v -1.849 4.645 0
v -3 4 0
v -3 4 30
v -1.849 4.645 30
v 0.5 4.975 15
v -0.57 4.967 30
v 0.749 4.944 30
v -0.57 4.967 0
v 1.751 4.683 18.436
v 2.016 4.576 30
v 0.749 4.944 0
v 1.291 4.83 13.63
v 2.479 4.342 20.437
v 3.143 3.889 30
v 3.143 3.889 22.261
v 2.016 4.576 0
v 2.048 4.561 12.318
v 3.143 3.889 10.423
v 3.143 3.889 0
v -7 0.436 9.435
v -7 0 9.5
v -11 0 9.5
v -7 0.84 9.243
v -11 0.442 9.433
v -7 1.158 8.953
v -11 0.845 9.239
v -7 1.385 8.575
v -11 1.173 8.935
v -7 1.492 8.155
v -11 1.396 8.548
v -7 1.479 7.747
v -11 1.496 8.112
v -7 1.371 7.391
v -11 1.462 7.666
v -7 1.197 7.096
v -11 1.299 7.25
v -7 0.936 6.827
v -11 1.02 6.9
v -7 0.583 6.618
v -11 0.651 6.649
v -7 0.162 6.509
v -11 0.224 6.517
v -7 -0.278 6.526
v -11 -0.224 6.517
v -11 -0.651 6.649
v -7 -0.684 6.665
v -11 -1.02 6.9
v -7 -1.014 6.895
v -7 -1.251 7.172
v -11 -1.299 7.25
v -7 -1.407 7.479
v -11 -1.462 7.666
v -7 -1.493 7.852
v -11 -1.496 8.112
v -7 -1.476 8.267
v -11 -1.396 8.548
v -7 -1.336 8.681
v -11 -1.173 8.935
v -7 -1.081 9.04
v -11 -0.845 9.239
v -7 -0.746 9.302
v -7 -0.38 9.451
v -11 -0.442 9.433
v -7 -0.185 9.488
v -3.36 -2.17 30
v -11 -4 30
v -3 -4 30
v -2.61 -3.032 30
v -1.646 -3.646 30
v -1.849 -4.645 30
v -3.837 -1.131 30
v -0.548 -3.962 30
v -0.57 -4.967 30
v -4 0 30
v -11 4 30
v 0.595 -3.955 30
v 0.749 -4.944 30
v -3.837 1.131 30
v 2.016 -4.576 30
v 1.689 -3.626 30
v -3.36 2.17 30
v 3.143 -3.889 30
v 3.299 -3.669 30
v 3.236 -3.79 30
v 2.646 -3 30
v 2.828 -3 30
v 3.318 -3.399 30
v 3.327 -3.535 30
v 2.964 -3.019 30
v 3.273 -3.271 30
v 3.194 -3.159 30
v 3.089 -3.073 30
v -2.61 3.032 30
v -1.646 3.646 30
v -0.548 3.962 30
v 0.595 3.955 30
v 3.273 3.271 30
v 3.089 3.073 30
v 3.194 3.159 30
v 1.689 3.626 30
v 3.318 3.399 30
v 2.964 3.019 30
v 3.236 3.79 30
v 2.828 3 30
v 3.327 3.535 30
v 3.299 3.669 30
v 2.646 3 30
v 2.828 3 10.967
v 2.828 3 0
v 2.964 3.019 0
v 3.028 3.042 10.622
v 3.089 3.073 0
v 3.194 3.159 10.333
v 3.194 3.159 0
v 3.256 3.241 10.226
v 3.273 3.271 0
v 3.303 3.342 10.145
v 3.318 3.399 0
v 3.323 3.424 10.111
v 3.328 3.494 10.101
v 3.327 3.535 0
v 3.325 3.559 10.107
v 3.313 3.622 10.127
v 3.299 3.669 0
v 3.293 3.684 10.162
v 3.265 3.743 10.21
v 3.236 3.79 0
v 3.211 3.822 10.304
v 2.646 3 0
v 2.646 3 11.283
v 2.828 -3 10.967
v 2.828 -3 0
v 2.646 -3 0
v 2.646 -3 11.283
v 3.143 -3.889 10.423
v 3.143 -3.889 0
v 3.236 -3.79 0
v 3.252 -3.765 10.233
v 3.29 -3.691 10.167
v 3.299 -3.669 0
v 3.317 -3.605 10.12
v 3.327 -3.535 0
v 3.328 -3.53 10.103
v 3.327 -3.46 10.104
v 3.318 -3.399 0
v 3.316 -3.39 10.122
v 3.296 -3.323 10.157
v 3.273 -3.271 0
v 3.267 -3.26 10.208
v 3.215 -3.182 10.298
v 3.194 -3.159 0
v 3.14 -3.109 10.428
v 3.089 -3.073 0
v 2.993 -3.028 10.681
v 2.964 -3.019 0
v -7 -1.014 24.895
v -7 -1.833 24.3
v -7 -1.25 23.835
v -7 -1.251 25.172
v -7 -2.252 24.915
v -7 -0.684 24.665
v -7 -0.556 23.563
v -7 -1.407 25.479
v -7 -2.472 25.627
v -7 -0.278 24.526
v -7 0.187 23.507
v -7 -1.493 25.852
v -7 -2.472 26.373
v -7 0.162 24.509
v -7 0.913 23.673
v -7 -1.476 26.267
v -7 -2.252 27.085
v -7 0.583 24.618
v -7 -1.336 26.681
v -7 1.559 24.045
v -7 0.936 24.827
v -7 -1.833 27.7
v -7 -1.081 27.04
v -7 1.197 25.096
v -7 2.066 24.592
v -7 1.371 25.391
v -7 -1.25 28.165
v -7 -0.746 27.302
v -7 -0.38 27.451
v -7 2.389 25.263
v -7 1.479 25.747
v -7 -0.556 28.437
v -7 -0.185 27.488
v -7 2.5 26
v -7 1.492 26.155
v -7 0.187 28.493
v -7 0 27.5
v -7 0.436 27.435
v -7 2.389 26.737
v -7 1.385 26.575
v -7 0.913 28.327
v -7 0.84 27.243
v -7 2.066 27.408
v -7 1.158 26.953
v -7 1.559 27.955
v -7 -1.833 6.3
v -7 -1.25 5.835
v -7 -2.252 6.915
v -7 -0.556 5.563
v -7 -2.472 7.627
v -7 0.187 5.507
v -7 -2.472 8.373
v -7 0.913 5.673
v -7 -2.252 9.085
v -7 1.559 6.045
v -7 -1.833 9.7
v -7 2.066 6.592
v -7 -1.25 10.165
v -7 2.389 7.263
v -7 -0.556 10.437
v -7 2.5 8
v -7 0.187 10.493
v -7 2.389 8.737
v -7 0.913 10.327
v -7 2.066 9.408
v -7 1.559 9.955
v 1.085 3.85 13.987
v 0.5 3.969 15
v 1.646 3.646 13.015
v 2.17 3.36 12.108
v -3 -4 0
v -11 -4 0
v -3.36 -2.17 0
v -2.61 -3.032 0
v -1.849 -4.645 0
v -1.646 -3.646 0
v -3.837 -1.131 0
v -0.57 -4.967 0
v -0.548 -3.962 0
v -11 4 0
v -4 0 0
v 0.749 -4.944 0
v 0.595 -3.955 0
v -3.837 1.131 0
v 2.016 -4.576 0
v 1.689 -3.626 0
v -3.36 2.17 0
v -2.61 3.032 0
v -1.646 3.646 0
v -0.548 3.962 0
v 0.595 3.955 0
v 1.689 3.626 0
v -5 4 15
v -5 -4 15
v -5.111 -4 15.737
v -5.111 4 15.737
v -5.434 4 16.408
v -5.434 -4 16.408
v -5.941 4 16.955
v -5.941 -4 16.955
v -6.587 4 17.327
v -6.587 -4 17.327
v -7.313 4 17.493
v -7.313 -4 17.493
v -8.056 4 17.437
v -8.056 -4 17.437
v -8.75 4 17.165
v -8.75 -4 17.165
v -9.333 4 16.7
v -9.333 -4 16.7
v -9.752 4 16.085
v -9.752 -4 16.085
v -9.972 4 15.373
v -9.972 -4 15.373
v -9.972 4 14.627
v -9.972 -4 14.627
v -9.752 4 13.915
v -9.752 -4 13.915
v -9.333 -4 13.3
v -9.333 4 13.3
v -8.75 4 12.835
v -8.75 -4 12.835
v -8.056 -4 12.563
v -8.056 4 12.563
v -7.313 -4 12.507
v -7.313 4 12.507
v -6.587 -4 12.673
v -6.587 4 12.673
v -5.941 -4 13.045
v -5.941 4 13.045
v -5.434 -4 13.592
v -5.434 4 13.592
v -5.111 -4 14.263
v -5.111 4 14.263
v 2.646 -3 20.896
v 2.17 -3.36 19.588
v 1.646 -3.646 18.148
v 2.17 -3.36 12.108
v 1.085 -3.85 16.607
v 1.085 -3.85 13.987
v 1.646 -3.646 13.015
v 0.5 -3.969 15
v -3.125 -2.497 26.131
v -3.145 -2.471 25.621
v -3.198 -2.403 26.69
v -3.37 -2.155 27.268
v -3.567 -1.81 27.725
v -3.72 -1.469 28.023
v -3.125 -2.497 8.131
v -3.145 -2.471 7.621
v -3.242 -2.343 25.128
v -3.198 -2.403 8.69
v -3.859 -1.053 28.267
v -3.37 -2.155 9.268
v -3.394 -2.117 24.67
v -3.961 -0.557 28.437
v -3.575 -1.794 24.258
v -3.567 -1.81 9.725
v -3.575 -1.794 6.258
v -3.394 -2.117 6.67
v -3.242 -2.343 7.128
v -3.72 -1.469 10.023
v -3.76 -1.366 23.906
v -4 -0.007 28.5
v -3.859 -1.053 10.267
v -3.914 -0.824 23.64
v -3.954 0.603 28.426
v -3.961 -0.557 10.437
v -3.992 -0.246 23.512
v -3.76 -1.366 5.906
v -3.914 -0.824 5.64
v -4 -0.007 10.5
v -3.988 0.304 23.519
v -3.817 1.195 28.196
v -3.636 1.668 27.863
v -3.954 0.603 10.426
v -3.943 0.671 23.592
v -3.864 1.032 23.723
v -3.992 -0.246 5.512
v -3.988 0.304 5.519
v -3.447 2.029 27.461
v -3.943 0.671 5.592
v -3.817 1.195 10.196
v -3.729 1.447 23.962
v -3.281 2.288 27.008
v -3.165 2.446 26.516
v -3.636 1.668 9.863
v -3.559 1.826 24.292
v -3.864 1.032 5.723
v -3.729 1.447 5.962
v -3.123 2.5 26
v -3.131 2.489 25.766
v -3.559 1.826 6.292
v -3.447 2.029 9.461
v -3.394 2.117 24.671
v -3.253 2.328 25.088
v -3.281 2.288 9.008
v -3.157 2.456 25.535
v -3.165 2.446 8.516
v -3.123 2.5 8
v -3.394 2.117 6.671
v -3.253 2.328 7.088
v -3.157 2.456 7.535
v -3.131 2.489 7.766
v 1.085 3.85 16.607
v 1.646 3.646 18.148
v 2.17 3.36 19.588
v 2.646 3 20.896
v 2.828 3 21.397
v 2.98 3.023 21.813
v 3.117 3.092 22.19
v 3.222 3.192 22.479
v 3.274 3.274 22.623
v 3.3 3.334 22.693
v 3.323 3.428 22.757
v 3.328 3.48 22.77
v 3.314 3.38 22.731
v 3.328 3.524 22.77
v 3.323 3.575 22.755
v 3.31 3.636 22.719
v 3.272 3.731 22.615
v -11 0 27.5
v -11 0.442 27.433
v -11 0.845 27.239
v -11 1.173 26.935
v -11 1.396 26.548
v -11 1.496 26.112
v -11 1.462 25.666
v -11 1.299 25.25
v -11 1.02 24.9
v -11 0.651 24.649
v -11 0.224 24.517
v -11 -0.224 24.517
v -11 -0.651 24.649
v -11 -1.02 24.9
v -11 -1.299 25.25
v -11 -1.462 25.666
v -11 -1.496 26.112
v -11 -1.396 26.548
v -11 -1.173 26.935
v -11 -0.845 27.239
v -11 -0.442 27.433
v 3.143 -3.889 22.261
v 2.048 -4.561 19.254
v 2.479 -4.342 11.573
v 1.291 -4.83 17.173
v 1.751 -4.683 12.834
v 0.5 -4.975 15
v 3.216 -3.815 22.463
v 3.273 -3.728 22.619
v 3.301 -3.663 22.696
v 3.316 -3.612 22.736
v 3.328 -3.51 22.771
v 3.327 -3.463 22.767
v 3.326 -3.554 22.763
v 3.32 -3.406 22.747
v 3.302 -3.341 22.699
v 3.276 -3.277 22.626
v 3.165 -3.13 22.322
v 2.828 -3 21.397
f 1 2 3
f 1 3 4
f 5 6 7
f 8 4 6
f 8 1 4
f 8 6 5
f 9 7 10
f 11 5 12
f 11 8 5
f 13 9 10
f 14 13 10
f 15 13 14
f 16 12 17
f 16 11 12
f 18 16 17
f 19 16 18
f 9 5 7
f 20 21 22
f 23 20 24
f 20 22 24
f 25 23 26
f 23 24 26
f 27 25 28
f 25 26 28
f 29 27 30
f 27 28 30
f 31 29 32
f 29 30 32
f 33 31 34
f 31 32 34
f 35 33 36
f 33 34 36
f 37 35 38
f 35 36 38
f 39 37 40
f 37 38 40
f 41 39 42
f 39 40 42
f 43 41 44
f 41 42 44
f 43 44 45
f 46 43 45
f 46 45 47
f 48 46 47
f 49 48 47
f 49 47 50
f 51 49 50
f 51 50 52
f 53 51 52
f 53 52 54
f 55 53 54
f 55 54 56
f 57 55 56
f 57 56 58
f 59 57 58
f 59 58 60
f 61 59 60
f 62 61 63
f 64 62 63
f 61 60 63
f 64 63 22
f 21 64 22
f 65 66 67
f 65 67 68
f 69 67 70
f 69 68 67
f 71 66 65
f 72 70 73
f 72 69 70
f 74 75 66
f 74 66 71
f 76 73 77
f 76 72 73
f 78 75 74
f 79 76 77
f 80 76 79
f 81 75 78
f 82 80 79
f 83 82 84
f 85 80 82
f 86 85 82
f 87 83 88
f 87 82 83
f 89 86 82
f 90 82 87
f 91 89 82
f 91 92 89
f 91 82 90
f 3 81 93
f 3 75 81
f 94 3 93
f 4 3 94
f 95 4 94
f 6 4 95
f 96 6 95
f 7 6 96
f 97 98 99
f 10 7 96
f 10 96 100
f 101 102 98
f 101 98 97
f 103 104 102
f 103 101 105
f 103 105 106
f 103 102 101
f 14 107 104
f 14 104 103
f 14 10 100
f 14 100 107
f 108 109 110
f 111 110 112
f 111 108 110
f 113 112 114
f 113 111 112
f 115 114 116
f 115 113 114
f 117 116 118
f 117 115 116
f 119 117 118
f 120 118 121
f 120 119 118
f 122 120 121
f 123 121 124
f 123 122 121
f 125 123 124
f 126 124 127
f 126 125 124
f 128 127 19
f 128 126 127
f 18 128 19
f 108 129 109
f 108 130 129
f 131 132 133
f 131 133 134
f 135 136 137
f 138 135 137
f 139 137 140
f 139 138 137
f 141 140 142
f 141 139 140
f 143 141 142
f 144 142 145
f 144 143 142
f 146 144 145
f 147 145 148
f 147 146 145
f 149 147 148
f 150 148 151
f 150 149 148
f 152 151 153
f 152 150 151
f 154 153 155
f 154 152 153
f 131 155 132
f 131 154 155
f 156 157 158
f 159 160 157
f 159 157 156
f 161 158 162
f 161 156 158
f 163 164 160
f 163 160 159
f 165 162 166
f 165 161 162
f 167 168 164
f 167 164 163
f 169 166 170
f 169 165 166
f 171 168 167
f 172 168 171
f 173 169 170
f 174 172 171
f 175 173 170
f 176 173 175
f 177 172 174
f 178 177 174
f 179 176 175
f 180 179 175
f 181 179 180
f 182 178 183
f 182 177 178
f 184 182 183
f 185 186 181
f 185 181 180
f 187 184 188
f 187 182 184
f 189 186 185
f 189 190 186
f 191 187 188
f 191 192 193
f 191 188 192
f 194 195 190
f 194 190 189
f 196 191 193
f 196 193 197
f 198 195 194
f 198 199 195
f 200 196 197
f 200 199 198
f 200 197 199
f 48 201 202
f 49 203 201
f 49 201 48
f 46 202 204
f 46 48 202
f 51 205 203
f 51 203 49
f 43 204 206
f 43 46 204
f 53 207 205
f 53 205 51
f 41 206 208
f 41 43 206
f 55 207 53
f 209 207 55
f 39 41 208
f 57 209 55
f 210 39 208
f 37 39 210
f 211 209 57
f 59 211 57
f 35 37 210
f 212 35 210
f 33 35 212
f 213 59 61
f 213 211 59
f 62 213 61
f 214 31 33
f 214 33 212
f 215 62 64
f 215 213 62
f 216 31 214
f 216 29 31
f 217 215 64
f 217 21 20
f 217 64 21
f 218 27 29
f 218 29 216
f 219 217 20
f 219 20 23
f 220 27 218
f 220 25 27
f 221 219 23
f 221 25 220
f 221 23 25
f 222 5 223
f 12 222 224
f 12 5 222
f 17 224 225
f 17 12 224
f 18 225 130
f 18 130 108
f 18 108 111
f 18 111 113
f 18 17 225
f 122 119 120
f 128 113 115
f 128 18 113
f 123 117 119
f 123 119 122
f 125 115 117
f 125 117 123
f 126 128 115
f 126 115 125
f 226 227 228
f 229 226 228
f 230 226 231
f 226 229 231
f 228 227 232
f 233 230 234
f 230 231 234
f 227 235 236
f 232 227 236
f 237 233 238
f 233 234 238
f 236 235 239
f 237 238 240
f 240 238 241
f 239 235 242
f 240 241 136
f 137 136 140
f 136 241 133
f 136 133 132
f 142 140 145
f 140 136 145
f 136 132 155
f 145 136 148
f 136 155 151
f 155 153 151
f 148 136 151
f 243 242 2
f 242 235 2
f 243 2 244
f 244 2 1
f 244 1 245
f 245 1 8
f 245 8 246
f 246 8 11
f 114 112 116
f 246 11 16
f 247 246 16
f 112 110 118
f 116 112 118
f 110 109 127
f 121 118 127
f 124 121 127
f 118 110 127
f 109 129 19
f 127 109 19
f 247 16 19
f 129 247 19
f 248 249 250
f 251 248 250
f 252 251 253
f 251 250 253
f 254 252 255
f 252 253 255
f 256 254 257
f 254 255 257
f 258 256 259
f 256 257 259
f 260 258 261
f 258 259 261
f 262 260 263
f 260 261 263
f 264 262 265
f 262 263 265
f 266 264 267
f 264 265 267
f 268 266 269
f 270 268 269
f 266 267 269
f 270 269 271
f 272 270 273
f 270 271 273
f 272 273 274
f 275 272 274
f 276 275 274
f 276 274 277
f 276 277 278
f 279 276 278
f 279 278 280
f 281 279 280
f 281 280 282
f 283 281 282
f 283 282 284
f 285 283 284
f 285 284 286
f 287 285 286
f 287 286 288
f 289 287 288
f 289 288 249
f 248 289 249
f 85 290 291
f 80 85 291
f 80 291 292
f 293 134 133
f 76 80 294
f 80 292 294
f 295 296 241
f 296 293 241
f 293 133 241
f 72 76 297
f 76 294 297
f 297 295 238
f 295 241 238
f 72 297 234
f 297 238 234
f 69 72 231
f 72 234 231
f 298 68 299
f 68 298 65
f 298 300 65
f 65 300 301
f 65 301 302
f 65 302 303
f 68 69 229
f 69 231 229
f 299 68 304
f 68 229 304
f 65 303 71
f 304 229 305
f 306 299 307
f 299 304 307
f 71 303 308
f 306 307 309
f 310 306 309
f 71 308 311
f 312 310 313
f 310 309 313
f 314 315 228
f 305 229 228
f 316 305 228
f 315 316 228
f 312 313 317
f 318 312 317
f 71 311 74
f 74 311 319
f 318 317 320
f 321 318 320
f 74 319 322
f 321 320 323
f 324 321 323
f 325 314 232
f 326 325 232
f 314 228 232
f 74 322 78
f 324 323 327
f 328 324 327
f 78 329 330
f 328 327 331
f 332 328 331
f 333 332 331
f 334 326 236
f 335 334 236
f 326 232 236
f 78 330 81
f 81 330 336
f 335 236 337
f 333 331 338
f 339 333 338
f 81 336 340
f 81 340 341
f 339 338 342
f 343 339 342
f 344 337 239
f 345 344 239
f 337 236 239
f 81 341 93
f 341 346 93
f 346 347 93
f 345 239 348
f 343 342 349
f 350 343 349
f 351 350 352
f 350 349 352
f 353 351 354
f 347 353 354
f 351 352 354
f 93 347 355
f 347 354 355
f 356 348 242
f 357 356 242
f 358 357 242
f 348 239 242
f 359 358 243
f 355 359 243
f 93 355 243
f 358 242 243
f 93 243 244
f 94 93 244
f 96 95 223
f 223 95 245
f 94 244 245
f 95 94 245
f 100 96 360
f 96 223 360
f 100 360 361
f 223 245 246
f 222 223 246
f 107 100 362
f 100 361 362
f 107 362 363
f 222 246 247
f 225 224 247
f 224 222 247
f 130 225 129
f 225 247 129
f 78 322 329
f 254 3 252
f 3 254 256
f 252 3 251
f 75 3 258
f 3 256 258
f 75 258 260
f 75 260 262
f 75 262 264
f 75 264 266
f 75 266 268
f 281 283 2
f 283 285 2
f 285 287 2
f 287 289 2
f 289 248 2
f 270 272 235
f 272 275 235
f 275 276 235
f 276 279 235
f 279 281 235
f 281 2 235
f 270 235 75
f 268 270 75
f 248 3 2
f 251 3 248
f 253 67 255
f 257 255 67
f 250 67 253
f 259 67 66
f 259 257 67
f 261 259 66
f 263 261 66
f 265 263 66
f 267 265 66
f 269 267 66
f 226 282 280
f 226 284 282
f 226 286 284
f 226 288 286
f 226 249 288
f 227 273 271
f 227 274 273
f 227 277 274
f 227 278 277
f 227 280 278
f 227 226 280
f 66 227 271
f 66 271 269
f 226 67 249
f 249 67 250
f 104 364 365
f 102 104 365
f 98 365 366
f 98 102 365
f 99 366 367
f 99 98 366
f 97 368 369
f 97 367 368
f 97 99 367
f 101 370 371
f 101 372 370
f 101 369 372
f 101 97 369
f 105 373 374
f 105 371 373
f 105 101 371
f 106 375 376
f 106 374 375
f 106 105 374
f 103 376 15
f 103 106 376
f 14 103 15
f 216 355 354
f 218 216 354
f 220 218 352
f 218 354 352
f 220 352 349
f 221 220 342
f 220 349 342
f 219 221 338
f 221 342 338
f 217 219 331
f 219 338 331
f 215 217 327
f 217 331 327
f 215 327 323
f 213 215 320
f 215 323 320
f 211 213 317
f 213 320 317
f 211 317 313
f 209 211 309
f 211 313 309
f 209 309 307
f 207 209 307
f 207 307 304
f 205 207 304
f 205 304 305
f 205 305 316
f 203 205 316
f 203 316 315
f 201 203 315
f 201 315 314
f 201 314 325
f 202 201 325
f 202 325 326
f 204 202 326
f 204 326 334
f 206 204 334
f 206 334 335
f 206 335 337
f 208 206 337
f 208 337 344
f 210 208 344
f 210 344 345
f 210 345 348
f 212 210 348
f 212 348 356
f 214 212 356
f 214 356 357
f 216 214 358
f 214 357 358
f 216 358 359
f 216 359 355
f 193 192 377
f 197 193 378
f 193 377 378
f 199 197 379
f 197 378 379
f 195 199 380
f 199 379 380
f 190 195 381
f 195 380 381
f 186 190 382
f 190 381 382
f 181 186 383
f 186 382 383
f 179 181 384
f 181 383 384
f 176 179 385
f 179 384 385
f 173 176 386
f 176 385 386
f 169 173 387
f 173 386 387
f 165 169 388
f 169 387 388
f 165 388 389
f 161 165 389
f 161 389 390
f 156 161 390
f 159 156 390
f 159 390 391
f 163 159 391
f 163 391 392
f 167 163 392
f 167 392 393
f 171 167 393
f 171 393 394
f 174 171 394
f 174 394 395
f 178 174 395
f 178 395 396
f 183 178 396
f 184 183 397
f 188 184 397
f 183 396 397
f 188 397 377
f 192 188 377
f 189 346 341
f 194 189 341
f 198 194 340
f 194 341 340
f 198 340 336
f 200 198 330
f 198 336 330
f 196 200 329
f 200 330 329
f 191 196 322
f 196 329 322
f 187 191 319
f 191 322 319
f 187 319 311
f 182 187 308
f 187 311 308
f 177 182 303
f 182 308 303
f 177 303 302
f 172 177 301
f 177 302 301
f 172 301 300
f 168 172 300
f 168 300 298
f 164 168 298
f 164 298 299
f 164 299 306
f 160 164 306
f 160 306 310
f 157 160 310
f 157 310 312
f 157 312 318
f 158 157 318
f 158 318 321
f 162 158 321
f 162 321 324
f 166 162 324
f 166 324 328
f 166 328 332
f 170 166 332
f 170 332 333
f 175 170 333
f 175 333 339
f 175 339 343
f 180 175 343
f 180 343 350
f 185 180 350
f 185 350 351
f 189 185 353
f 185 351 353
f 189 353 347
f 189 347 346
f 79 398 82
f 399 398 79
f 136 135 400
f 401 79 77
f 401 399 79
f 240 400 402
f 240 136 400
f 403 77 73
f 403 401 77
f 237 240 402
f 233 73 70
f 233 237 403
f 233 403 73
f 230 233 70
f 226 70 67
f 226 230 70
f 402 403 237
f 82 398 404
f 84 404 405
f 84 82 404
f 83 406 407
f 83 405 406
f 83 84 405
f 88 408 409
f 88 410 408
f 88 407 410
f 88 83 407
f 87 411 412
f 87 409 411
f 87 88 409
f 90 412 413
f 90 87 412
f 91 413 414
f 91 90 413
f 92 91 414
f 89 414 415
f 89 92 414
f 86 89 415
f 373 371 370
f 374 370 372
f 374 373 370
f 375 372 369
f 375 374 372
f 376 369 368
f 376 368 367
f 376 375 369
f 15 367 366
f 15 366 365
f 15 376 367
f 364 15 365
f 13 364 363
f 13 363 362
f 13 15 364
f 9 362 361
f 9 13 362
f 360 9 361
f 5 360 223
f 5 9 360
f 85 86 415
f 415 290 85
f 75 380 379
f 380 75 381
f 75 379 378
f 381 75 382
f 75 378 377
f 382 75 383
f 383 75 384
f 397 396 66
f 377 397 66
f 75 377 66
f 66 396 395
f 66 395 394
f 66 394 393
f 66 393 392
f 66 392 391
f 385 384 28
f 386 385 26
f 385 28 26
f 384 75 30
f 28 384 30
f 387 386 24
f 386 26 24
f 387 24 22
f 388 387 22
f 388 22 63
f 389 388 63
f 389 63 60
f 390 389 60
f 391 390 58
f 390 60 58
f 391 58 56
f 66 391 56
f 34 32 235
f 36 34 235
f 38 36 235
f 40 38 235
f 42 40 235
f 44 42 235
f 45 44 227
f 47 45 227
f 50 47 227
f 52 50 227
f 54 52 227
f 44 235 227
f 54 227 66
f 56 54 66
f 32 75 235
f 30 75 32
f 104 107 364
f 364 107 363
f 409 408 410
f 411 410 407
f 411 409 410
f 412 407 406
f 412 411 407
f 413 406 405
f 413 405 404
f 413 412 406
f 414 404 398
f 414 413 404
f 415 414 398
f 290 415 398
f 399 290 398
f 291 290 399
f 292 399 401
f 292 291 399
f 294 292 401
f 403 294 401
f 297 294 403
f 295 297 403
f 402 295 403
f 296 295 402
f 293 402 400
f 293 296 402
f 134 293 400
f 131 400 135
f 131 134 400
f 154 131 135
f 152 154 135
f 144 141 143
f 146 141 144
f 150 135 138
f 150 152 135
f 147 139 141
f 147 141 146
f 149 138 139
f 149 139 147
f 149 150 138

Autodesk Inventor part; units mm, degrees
ref_plane "YZ Plane" through (0, 0, 0) normal (1, 0, 0) x (0, 1, 0)
ref_plane "XZ Plane" through (0, 0, 0) normal (0, 1, 0) x (-1, 0, 0)
ref_plane "XY Plane" through (0, 0, 0) normal (0, 0, 1) x (1, 0, 0)
sketch "Sketch1" plane through (0, 0, 0) normal (0, 0, 1) x (1, 0, 0)
  arc A0 (2.6458, 3) -> (2.6458, -3) centre (0, 0) ccw
  arc A1 (4, 3) -> (4, -3) centre (0, 0) ccw
  line L0 (-4, -3) -> (-11, -3)
  line L1 (-11, -3) -> (-11, 3)
  line L2 (-11, 3) -> (-4, 3)
  line L3 (-4, 3) -> (-4, -3)
  line L4 (2.6458, 3) -> (4, 3)
  line L5 (4, 3) -> (4, -3) construction
  line L6 (4, -3) -> (2.6458, -3)
  line L7 (2.6458, -3) -> (2.6458, 3) construction
  line L8 (-11, 3) -> (-3, 3)
  line L9 (-3, 3) -> (-3, 4)
  line L10 (-3, 4) -> (-11, 4)
  line L11 (-11, 4) -> (-11, 3)
  line L12 (-11, -3) -> (-3, -3)
  line L13 (-3, -3) -> (-3, -4)
  line L14 (-3, -4) -> (-11, -4)
  line L15 (-11, -4) -> (-11, -3)
  point P0 (2.6458, 0)
  dimension "d0" = 8
  dimension "d1" = 10
  dimension "d3" = 6
  dimension "d24" = 11
  dimension "d25" = 1
  dimension "d26" = 1
extrude "Extrusion1" add sketch "Sketch1" along normal blind 30
sketch "Sketch2" plane through (-11, -4, 0) normal (-1, 0, 0) x (0, 0, 1)
  circle A0 centre (8, 4) radius 1.5
  circle A1 centre (26, 4) radius 1.5
  line L0 (0, 8) -> (0, 0) projected
  point P0 (0, 4)
  dimension "d6" = 3
  dimension "d9" = 3
  dimension "d10" = 18
extrude "Extrusion2" cut sketch "Sketch2" against normal blind 10
fillet "Fillet1" radius 0.5 2 edges at (4, 3, 15) (4, -3, 15)
sketch "Sketch3" plane through (-11, -4, 0) normal (0, -1, 0) x (1, 0, 0)
  circle A0 centre (3.5, 15) radius 2.5
  line L0 (0, 0) -> (0, 30)
  line L1 (0, 0) -> (7, 0)
  line L2 (19.5327, 37.0698) -> (11.5, 15)
  line L3 (19.5327, 37.0698) -> (43.0189, 37.0698) construction
  line L4 (11.5, 15) -> (19.5327, 1.0869)
  line L5 (19.5327, 1.0869) -> (19.5327, 37.0698)
  point P0 (11, 0)
  point P1 (0, 15)
  point P2 (3.5, 0)
  dimension "d14" = 5
  dimension "d17" = 110
  dimension "d18" = 130
  dimension "d19" = 8
extrude "Extrusion3" cut sketch "Sketch3" along normal through all both and the other way through all
sketch "Sketch4" plane through (0, 0, 0) normal (1, 0, 0) x (0, 1, 0)
  spline S0 degree 2 poles (0, 9.5) (2.5981, 9.5) (1.299, 7.25) (0, 5) (-1.299, 7.25) (-2.5981, 9.5) (0, 9.5) knots 0 0 0 0.333333 0.333333 0.666667 0.666667 1 1 1 weights 1 0.5 1 0.5 1 0.5 1 projected
  spline S1 degree 2 poles (0, 27.5) (2.5981, 27.5) (1.299, 25.25) (0, 23) (-1.299, 25.25) (-2.5981, 27.5) (0, 27.5) knots 0 0 0 0.333333 0.333333 0.666667 0.666667 1 1 1 weights 1 0.5 1 0.5 1 0.5 1 projected
  circle A0 centre (0, 26) radius 2.5
  circle A1 centre (0, 8) radius 2.5
  point P0 (0, 0)
  dimension "d20" = 5
  dimension "d21" = 5
extrude "Extrusion4" cut sketch "Sketch4" against normal blind 7
equation "\"d26\" = d25"
properties part number "brush clip"
